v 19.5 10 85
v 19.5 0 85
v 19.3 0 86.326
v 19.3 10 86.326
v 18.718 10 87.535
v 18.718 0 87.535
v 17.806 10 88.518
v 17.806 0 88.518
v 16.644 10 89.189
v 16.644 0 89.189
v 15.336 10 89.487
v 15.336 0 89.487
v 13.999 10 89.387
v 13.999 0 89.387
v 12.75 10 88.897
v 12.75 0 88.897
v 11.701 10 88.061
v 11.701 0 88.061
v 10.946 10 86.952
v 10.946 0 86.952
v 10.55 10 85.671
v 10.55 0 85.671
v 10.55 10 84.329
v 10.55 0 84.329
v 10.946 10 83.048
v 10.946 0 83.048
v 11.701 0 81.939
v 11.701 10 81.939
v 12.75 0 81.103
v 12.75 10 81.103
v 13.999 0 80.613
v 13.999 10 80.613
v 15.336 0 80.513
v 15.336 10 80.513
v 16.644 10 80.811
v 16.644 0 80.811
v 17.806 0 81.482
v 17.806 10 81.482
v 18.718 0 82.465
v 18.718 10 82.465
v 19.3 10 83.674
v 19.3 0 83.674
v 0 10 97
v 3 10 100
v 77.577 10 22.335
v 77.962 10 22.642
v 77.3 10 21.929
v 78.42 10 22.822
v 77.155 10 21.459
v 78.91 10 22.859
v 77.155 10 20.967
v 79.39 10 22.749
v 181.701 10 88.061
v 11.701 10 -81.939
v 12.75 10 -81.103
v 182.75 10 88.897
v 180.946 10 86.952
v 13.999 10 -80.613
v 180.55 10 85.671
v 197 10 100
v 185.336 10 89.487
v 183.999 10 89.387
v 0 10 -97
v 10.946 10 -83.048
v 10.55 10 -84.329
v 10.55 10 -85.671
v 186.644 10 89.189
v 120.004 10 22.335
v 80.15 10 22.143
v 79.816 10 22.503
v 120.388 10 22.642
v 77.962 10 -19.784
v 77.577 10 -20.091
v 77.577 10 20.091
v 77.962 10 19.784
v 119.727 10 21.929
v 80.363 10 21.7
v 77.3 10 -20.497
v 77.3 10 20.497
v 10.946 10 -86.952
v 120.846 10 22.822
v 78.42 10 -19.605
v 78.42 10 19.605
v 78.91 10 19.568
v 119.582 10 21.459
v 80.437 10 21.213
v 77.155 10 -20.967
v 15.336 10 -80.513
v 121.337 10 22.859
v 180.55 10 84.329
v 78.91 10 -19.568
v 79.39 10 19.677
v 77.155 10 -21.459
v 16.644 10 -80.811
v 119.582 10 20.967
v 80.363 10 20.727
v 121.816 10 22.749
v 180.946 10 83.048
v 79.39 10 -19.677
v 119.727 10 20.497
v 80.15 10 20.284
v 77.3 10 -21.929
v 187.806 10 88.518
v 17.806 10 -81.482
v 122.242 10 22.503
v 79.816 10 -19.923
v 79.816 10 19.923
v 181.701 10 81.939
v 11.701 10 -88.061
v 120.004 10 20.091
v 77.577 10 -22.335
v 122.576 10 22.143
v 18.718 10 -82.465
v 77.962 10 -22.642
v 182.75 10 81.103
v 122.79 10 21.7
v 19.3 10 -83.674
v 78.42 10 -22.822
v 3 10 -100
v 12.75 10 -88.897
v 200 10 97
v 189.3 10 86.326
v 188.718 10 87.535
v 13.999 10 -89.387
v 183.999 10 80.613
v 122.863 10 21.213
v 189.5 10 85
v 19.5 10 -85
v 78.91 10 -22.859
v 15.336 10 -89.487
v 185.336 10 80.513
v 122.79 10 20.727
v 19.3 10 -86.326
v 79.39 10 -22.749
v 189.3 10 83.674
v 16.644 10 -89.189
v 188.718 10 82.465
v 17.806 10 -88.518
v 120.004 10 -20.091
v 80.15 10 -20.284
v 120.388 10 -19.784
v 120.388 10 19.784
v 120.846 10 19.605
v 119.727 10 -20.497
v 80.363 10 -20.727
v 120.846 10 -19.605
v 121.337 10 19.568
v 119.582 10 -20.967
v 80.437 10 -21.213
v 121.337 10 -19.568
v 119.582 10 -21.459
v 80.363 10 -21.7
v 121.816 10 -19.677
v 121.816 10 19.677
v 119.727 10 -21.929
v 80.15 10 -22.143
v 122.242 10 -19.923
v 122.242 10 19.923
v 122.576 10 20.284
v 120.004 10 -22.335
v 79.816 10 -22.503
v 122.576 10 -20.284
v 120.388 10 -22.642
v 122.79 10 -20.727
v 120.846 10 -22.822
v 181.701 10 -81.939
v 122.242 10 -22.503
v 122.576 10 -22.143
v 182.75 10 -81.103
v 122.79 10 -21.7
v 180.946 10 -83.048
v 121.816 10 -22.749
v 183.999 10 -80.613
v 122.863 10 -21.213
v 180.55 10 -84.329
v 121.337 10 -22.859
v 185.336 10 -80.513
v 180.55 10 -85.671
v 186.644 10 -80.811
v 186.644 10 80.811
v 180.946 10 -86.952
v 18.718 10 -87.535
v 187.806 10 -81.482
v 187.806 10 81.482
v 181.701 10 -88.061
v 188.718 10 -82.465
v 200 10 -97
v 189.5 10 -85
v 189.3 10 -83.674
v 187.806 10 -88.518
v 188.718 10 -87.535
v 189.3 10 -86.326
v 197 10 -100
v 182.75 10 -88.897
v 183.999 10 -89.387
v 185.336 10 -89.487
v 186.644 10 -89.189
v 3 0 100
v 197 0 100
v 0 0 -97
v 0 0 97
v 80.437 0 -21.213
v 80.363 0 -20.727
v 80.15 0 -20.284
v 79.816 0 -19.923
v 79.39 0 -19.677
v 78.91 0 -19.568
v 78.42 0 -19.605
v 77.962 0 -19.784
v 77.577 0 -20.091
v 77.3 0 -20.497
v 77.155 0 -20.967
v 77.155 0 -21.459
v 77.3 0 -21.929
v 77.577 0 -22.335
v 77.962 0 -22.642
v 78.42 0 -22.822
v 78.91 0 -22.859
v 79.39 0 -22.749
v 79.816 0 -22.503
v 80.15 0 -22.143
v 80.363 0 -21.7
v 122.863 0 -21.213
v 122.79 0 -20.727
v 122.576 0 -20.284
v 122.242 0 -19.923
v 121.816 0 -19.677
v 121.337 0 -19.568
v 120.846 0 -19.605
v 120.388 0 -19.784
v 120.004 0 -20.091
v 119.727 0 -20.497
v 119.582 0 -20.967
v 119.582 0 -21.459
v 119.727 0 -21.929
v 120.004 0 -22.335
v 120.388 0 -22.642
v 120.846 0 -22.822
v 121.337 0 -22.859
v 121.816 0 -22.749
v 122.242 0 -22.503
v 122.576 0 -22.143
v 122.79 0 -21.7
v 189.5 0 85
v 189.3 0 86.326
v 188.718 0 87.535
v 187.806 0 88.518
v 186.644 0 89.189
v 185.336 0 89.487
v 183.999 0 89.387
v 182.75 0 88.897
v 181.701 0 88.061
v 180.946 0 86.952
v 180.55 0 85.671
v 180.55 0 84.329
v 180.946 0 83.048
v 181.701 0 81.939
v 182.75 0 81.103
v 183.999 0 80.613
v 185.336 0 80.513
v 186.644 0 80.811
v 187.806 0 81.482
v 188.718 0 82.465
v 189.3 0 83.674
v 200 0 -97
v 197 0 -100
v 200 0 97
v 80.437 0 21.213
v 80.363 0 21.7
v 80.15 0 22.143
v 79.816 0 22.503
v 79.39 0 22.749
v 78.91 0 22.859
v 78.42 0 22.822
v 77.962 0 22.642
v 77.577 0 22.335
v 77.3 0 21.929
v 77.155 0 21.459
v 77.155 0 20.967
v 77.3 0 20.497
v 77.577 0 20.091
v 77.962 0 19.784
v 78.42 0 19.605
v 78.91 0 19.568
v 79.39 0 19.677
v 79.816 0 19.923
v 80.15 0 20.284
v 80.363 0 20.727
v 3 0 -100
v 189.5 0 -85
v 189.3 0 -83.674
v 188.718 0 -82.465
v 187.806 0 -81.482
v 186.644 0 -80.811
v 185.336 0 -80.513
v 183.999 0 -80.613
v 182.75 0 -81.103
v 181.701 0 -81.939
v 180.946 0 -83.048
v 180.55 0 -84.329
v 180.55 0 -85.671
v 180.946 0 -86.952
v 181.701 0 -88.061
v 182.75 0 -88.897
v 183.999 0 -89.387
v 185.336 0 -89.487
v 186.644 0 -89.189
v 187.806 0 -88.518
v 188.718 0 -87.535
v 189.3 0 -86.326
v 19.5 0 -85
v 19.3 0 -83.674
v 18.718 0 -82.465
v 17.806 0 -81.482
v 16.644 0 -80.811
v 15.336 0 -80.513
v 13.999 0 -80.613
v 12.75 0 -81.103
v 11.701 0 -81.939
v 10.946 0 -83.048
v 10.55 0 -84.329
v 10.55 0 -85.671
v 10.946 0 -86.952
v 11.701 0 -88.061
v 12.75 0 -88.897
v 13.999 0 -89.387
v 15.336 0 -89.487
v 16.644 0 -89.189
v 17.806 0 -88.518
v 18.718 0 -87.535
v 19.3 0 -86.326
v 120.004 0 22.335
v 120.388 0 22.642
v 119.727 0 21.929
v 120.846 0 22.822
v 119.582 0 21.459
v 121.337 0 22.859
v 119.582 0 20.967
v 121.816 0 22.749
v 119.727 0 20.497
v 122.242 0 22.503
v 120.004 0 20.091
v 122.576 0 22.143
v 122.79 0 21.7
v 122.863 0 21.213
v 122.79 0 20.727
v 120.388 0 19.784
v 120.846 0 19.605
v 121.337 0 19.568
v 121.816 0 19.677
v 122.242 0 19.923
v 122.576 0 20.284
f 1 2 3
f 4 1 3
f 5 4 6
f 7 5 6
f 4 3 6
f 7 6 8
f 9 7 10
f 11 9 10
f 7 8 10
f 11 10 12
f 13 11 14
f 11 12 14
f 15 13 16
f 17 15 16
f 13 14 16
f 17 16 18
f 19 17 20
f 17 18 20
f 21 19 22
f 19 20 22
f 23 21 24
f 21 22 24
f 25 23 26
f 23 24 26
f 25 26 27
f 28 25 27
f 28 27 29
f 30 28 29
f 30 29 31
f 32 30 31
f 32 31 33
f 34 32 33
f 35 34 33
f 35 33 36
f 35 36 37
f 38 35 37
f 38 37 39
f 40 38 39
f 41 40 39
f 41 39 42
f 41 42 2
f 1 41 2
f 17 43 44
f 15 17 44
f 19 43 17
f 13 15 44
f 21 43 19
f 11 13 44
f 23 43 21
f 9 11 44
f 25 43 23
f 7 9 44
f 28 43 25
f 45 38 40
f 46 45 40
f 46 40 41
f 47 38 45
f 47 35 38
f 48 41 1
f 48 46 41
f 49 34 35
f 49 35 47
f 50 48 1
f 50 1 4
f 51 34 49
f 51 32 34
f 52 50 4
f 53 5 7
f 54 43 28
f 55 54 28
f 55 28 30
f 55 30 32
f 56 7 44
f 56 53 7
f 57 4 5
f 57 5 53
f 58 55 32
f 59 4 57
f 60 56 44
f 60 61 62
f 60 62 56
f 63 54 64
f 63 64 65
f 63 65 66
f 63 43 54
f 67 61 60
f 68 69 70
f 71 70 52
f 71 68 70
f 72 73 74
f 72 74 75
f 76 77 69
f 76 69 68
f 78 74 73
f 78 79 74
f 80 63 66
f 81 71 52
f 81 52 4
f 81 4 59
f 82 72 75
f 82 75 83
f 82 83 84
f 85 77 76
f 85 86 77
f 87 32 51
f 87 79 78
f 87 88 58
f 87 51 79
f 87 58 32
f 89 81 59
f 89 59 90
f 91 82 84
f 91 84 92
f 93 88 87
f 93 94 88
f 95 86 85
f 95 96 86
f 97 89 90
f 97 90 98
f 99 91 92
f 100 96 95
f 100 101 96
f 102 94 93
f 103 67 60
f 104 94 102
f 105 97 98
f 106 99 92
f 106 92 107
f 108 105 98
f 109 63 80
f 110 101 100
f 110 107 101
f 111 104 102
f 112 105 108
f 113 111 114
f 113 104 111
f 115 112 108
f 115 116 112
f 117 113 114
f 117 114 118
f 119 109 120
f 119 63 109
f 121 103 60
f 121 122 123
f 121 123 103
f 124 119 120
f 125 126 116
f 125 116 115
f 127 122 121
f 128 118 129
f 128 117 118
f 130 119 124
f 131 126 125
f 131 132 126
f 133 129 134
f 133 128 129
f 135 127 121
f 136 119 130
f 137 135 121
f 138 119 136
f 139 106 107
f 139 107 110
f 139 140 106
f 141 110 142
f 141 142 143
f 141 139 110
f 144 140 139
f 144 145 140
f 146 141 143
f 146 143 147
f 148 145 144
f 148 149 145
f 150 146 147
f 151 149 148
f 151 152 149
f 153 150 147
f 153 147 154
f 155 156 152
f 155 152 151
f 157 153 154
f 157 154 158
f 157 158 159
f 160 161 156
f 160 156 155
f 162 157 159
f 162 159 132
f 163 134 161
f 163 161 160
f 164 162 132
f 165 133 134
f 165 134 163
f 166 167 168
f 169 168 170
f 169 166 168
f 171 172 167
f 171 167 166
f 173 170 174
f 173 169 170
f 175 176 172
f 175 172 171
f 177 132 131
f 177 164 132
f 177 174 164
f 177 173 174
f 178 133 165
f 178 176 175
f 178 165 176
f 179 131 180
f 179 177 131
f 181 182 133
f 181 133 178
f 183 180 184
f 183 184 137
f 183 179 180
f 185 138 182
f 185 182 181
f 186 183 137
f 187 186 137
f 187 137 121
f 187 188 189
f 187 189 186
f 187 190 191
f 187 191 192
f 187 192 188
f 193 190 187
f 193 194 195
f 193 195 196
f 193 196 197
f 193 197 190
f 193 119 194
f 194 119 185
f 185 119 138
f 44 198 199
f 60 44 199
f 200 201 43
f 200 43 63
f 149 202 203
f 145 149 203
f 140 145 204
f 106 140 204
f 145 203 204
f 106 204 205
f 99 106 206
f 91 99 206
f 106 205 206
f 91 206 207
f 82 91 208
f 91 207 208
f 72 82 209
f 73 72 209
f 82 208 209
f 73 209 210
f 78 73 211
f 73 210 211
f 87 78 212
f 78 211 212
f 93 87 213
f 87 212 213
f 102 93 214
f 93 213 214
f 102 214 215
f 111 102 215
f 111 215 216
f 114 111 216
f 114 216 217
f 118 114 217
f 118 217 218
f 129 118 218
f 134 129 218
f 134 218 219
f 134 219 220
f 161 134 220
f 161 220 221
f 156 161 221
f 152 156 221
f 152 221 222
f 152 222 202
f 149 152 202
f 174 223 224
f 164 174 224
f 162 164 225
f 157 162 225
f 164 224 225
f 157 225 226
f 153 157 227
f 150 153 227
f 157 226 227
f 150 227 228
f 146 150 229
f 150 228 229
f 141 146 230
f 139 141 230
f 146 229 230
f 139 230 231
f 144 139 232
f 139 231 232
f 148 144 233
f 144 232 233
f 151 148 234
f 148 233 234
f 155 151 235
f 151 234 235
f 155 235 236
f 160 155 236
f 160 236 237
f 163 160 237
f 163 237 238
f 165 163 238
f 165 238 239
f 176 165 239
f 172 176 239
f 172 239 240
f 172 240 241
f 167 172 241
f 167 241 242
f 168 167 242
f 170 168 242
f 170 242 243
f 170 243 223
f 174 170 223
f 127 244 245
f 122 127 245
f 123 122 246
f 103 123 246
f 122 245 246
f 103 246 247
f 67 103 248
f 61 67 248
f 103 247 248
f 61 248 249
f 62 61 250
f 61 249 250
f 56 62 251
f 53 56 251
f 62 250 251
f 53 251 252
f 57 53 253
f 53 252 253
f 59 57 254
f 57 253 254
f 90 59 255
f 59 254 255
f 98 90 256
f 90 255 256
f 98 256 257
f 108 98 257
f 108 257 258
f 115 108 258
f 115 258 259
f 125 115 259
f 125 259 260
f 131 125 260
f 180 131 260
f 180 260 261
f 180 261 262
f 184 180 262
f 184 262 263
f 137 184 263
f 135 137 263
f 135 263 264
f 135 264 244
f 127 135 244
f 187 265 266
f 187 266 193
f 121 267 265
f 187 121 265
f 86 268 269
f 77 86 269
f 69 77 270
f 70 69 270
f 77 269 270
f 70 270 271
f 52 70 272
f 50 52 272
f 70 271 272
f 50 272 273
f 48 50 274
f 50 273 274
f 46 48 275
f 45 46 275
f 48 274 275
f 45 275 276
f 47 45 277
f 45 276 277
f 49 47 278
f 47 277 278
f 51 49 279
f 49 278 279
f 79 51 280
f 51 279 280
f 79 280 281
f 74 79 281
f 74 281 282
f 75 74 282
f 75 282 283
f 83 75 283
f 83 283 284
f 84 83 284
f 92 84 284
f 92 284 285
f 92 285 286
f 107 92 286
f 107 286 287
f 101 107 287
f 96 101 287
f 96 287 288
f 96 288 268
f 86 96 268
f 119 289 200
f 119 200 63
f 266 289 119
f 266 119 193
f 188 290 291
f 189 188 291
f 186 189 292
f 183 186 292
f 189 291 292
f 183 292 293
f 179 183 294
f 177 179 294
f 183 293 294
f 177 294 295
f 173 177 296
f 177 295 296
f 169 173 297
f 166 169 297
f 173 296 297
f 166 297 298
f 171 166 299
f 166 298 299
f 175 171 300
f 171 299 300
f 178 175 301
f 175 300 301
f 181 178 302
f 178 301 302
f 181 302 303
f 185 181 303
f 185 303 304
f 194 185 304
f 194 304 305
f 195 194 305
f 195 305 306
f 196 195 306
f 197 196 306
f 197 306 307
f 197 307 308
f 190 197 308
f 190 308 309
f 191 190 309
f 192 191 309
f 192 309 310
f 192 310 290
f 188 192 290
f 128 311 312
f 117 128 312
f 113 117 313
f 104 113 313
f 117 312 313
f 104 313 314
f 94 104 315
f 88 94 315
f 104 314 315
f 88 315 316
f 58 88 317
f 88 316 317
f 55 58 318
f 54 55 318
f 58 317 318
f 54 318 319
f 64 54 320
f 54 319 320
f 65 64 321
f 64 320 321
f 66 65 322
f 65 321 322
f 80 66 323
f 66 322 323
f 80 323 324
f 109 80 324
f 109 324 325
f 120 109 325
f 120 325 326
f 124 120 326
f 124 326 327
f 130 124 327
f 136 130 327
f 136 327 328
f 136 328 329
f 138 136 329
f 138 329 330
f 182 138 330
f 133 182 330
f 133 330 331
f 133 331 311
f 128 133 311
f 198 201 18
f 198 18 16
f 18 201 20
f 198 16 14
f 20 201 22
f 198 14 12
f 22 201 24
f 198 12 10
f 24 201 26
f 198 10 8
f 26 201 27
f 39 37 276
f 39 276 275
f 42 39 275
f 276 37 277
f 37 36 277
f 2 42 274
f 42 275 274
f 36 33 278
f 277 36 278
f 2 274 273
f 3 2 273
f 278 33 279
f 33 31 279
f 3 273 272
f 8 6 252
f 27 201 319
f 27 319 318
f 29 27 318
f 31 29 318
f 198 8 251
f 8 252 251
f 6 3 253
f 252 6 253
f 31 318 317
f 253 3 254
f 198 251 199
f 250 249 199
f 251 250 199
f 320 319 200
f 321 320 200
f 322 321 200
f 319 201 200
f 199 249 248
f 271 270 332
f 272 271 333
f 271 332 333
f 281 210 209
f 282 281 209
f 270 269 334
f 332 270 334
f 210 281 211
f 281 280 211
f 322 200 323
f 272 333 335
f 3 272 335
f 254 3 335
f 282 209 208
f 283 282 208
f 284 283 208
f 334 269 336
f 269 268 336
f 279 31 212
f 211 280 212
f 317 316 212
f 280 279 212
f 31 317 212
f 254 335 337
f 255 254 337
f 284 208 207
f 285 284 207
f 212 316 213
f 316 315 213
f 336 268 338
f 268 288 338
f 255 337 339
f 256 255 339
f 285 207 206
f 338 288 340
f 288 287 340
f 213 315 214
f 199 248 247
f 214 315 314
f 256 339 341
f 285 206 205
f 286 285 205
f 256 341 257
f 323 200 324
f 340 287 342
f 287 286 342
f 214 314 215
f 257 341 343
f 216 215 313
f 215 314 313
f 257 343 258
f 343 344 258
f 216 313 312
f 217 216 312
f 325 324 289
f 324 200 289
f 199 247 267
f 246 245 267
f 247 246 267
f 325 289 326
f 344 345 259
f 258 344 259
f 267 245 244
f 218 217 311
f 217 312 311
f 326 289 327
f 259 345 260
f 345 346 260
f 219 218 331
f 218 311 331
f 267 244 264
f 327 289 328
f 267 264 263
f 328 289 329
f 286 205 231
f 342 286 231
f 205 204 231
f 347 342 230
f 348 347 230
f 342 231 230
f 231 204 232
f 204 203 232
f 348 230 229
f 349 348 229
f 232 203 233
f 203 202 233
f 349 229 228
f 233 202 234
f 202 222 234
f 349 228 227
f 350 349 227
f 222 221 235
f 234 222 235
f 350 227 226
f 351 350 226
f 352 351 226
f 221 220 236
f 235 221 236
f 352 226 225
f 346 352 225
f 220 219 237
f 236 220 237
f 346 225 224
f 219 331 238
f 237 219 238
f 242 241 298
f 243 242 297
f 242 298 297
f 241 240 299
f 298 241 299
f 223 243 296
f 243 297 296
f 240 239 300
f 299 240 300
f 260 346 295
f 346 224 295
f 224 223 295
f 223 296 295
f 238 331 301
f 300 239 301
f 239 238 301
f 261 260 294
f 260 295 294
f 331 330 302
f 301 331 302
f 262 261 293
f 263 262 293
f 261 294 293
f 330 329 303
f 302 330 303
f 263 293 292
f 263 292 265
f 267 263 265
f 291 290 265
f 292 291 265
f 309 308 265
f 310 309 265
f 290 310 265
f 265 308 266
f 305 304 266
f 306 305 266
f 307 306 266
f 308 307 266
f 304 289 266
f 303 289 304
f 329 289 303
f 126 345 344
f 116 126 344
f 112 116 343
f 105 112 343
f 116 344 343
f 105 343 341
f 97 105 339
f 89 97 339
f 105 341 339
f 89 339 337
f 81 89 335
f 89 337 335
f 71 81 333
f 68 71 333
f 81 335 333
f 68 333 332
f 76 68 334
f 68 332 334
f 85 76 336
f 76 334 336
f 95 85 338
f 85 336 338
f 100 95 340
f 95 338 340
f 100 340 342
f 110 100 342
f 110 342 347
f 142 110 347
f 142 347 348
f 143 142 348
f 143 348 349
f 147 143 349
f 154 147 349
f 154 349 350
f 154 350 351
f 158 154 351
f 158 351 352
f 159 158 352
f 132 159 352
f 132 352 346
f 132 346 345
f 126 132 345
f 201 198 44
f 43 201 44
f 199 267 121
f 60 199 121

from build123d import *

# Parameters (mm, degrees)
SKETCH1_W             = 200
SKETCH1_H             = 200
BOSS_EXTRUDE1_DEPTH   = 10
M8_CLEARANCE_HOLE1_D  = 9
M4X0_7_TAPPED_HOLE1_D = 3.3
CHAMFER1_SIZE         = 3


with BuildPart() as part:
    # Sketch1 → Boss-Extrude1 (new body)
    with BuildSketch(Plane(origin=(0, 0, 0), x_dir=(1, 0, 0), z_dir=(0, 1, 0))):
        with Locations((100, 0)):
            Rectangle(SKETCH1_W, SKETCH1_H)
    extrude(amount=BOSS_EXTRUDE1_DEPTH)

    # M8 Clearance Hole1 (through all)
    with Locations(Plane(origin=(0, 10, 0), x_dir=(-1, 0, 0), z_dir=(0, 1, 0))):
        with Locations((-15, 85), (-15, -85), (-185, -85), (-185, 85)):
            Hole(M8_CLEARANCE_HOLE1_D / 2)

    # M4x0.7 Tapped Hole1 (through all)
    with Locations(Plane(origin=(0, 10, 0), x_dir=(-1, 0, 0), z_dir=(0, 1, 0))):
        with Locations((-78.786796564, 21.213203436), (-121.213203436, 21.213203436), (-121.213203436, -21.213203436), (-78.786796564, -21.213203436)):
            Hole(M4X0_7_TAPPED_HOLE1_D / 2)

    # Chamfer1
    chamfer1_edges = [part.edges().sort_by_distance(p)[0] for p in [
        (0, 5, -100),
        (200, 5, -100),
        (200, 5, 100),
        (0, 5, 100),
    ]]
    chamfer(chamfer1_edges, length=CHAMFER1_SIZE)


solid = part.part
